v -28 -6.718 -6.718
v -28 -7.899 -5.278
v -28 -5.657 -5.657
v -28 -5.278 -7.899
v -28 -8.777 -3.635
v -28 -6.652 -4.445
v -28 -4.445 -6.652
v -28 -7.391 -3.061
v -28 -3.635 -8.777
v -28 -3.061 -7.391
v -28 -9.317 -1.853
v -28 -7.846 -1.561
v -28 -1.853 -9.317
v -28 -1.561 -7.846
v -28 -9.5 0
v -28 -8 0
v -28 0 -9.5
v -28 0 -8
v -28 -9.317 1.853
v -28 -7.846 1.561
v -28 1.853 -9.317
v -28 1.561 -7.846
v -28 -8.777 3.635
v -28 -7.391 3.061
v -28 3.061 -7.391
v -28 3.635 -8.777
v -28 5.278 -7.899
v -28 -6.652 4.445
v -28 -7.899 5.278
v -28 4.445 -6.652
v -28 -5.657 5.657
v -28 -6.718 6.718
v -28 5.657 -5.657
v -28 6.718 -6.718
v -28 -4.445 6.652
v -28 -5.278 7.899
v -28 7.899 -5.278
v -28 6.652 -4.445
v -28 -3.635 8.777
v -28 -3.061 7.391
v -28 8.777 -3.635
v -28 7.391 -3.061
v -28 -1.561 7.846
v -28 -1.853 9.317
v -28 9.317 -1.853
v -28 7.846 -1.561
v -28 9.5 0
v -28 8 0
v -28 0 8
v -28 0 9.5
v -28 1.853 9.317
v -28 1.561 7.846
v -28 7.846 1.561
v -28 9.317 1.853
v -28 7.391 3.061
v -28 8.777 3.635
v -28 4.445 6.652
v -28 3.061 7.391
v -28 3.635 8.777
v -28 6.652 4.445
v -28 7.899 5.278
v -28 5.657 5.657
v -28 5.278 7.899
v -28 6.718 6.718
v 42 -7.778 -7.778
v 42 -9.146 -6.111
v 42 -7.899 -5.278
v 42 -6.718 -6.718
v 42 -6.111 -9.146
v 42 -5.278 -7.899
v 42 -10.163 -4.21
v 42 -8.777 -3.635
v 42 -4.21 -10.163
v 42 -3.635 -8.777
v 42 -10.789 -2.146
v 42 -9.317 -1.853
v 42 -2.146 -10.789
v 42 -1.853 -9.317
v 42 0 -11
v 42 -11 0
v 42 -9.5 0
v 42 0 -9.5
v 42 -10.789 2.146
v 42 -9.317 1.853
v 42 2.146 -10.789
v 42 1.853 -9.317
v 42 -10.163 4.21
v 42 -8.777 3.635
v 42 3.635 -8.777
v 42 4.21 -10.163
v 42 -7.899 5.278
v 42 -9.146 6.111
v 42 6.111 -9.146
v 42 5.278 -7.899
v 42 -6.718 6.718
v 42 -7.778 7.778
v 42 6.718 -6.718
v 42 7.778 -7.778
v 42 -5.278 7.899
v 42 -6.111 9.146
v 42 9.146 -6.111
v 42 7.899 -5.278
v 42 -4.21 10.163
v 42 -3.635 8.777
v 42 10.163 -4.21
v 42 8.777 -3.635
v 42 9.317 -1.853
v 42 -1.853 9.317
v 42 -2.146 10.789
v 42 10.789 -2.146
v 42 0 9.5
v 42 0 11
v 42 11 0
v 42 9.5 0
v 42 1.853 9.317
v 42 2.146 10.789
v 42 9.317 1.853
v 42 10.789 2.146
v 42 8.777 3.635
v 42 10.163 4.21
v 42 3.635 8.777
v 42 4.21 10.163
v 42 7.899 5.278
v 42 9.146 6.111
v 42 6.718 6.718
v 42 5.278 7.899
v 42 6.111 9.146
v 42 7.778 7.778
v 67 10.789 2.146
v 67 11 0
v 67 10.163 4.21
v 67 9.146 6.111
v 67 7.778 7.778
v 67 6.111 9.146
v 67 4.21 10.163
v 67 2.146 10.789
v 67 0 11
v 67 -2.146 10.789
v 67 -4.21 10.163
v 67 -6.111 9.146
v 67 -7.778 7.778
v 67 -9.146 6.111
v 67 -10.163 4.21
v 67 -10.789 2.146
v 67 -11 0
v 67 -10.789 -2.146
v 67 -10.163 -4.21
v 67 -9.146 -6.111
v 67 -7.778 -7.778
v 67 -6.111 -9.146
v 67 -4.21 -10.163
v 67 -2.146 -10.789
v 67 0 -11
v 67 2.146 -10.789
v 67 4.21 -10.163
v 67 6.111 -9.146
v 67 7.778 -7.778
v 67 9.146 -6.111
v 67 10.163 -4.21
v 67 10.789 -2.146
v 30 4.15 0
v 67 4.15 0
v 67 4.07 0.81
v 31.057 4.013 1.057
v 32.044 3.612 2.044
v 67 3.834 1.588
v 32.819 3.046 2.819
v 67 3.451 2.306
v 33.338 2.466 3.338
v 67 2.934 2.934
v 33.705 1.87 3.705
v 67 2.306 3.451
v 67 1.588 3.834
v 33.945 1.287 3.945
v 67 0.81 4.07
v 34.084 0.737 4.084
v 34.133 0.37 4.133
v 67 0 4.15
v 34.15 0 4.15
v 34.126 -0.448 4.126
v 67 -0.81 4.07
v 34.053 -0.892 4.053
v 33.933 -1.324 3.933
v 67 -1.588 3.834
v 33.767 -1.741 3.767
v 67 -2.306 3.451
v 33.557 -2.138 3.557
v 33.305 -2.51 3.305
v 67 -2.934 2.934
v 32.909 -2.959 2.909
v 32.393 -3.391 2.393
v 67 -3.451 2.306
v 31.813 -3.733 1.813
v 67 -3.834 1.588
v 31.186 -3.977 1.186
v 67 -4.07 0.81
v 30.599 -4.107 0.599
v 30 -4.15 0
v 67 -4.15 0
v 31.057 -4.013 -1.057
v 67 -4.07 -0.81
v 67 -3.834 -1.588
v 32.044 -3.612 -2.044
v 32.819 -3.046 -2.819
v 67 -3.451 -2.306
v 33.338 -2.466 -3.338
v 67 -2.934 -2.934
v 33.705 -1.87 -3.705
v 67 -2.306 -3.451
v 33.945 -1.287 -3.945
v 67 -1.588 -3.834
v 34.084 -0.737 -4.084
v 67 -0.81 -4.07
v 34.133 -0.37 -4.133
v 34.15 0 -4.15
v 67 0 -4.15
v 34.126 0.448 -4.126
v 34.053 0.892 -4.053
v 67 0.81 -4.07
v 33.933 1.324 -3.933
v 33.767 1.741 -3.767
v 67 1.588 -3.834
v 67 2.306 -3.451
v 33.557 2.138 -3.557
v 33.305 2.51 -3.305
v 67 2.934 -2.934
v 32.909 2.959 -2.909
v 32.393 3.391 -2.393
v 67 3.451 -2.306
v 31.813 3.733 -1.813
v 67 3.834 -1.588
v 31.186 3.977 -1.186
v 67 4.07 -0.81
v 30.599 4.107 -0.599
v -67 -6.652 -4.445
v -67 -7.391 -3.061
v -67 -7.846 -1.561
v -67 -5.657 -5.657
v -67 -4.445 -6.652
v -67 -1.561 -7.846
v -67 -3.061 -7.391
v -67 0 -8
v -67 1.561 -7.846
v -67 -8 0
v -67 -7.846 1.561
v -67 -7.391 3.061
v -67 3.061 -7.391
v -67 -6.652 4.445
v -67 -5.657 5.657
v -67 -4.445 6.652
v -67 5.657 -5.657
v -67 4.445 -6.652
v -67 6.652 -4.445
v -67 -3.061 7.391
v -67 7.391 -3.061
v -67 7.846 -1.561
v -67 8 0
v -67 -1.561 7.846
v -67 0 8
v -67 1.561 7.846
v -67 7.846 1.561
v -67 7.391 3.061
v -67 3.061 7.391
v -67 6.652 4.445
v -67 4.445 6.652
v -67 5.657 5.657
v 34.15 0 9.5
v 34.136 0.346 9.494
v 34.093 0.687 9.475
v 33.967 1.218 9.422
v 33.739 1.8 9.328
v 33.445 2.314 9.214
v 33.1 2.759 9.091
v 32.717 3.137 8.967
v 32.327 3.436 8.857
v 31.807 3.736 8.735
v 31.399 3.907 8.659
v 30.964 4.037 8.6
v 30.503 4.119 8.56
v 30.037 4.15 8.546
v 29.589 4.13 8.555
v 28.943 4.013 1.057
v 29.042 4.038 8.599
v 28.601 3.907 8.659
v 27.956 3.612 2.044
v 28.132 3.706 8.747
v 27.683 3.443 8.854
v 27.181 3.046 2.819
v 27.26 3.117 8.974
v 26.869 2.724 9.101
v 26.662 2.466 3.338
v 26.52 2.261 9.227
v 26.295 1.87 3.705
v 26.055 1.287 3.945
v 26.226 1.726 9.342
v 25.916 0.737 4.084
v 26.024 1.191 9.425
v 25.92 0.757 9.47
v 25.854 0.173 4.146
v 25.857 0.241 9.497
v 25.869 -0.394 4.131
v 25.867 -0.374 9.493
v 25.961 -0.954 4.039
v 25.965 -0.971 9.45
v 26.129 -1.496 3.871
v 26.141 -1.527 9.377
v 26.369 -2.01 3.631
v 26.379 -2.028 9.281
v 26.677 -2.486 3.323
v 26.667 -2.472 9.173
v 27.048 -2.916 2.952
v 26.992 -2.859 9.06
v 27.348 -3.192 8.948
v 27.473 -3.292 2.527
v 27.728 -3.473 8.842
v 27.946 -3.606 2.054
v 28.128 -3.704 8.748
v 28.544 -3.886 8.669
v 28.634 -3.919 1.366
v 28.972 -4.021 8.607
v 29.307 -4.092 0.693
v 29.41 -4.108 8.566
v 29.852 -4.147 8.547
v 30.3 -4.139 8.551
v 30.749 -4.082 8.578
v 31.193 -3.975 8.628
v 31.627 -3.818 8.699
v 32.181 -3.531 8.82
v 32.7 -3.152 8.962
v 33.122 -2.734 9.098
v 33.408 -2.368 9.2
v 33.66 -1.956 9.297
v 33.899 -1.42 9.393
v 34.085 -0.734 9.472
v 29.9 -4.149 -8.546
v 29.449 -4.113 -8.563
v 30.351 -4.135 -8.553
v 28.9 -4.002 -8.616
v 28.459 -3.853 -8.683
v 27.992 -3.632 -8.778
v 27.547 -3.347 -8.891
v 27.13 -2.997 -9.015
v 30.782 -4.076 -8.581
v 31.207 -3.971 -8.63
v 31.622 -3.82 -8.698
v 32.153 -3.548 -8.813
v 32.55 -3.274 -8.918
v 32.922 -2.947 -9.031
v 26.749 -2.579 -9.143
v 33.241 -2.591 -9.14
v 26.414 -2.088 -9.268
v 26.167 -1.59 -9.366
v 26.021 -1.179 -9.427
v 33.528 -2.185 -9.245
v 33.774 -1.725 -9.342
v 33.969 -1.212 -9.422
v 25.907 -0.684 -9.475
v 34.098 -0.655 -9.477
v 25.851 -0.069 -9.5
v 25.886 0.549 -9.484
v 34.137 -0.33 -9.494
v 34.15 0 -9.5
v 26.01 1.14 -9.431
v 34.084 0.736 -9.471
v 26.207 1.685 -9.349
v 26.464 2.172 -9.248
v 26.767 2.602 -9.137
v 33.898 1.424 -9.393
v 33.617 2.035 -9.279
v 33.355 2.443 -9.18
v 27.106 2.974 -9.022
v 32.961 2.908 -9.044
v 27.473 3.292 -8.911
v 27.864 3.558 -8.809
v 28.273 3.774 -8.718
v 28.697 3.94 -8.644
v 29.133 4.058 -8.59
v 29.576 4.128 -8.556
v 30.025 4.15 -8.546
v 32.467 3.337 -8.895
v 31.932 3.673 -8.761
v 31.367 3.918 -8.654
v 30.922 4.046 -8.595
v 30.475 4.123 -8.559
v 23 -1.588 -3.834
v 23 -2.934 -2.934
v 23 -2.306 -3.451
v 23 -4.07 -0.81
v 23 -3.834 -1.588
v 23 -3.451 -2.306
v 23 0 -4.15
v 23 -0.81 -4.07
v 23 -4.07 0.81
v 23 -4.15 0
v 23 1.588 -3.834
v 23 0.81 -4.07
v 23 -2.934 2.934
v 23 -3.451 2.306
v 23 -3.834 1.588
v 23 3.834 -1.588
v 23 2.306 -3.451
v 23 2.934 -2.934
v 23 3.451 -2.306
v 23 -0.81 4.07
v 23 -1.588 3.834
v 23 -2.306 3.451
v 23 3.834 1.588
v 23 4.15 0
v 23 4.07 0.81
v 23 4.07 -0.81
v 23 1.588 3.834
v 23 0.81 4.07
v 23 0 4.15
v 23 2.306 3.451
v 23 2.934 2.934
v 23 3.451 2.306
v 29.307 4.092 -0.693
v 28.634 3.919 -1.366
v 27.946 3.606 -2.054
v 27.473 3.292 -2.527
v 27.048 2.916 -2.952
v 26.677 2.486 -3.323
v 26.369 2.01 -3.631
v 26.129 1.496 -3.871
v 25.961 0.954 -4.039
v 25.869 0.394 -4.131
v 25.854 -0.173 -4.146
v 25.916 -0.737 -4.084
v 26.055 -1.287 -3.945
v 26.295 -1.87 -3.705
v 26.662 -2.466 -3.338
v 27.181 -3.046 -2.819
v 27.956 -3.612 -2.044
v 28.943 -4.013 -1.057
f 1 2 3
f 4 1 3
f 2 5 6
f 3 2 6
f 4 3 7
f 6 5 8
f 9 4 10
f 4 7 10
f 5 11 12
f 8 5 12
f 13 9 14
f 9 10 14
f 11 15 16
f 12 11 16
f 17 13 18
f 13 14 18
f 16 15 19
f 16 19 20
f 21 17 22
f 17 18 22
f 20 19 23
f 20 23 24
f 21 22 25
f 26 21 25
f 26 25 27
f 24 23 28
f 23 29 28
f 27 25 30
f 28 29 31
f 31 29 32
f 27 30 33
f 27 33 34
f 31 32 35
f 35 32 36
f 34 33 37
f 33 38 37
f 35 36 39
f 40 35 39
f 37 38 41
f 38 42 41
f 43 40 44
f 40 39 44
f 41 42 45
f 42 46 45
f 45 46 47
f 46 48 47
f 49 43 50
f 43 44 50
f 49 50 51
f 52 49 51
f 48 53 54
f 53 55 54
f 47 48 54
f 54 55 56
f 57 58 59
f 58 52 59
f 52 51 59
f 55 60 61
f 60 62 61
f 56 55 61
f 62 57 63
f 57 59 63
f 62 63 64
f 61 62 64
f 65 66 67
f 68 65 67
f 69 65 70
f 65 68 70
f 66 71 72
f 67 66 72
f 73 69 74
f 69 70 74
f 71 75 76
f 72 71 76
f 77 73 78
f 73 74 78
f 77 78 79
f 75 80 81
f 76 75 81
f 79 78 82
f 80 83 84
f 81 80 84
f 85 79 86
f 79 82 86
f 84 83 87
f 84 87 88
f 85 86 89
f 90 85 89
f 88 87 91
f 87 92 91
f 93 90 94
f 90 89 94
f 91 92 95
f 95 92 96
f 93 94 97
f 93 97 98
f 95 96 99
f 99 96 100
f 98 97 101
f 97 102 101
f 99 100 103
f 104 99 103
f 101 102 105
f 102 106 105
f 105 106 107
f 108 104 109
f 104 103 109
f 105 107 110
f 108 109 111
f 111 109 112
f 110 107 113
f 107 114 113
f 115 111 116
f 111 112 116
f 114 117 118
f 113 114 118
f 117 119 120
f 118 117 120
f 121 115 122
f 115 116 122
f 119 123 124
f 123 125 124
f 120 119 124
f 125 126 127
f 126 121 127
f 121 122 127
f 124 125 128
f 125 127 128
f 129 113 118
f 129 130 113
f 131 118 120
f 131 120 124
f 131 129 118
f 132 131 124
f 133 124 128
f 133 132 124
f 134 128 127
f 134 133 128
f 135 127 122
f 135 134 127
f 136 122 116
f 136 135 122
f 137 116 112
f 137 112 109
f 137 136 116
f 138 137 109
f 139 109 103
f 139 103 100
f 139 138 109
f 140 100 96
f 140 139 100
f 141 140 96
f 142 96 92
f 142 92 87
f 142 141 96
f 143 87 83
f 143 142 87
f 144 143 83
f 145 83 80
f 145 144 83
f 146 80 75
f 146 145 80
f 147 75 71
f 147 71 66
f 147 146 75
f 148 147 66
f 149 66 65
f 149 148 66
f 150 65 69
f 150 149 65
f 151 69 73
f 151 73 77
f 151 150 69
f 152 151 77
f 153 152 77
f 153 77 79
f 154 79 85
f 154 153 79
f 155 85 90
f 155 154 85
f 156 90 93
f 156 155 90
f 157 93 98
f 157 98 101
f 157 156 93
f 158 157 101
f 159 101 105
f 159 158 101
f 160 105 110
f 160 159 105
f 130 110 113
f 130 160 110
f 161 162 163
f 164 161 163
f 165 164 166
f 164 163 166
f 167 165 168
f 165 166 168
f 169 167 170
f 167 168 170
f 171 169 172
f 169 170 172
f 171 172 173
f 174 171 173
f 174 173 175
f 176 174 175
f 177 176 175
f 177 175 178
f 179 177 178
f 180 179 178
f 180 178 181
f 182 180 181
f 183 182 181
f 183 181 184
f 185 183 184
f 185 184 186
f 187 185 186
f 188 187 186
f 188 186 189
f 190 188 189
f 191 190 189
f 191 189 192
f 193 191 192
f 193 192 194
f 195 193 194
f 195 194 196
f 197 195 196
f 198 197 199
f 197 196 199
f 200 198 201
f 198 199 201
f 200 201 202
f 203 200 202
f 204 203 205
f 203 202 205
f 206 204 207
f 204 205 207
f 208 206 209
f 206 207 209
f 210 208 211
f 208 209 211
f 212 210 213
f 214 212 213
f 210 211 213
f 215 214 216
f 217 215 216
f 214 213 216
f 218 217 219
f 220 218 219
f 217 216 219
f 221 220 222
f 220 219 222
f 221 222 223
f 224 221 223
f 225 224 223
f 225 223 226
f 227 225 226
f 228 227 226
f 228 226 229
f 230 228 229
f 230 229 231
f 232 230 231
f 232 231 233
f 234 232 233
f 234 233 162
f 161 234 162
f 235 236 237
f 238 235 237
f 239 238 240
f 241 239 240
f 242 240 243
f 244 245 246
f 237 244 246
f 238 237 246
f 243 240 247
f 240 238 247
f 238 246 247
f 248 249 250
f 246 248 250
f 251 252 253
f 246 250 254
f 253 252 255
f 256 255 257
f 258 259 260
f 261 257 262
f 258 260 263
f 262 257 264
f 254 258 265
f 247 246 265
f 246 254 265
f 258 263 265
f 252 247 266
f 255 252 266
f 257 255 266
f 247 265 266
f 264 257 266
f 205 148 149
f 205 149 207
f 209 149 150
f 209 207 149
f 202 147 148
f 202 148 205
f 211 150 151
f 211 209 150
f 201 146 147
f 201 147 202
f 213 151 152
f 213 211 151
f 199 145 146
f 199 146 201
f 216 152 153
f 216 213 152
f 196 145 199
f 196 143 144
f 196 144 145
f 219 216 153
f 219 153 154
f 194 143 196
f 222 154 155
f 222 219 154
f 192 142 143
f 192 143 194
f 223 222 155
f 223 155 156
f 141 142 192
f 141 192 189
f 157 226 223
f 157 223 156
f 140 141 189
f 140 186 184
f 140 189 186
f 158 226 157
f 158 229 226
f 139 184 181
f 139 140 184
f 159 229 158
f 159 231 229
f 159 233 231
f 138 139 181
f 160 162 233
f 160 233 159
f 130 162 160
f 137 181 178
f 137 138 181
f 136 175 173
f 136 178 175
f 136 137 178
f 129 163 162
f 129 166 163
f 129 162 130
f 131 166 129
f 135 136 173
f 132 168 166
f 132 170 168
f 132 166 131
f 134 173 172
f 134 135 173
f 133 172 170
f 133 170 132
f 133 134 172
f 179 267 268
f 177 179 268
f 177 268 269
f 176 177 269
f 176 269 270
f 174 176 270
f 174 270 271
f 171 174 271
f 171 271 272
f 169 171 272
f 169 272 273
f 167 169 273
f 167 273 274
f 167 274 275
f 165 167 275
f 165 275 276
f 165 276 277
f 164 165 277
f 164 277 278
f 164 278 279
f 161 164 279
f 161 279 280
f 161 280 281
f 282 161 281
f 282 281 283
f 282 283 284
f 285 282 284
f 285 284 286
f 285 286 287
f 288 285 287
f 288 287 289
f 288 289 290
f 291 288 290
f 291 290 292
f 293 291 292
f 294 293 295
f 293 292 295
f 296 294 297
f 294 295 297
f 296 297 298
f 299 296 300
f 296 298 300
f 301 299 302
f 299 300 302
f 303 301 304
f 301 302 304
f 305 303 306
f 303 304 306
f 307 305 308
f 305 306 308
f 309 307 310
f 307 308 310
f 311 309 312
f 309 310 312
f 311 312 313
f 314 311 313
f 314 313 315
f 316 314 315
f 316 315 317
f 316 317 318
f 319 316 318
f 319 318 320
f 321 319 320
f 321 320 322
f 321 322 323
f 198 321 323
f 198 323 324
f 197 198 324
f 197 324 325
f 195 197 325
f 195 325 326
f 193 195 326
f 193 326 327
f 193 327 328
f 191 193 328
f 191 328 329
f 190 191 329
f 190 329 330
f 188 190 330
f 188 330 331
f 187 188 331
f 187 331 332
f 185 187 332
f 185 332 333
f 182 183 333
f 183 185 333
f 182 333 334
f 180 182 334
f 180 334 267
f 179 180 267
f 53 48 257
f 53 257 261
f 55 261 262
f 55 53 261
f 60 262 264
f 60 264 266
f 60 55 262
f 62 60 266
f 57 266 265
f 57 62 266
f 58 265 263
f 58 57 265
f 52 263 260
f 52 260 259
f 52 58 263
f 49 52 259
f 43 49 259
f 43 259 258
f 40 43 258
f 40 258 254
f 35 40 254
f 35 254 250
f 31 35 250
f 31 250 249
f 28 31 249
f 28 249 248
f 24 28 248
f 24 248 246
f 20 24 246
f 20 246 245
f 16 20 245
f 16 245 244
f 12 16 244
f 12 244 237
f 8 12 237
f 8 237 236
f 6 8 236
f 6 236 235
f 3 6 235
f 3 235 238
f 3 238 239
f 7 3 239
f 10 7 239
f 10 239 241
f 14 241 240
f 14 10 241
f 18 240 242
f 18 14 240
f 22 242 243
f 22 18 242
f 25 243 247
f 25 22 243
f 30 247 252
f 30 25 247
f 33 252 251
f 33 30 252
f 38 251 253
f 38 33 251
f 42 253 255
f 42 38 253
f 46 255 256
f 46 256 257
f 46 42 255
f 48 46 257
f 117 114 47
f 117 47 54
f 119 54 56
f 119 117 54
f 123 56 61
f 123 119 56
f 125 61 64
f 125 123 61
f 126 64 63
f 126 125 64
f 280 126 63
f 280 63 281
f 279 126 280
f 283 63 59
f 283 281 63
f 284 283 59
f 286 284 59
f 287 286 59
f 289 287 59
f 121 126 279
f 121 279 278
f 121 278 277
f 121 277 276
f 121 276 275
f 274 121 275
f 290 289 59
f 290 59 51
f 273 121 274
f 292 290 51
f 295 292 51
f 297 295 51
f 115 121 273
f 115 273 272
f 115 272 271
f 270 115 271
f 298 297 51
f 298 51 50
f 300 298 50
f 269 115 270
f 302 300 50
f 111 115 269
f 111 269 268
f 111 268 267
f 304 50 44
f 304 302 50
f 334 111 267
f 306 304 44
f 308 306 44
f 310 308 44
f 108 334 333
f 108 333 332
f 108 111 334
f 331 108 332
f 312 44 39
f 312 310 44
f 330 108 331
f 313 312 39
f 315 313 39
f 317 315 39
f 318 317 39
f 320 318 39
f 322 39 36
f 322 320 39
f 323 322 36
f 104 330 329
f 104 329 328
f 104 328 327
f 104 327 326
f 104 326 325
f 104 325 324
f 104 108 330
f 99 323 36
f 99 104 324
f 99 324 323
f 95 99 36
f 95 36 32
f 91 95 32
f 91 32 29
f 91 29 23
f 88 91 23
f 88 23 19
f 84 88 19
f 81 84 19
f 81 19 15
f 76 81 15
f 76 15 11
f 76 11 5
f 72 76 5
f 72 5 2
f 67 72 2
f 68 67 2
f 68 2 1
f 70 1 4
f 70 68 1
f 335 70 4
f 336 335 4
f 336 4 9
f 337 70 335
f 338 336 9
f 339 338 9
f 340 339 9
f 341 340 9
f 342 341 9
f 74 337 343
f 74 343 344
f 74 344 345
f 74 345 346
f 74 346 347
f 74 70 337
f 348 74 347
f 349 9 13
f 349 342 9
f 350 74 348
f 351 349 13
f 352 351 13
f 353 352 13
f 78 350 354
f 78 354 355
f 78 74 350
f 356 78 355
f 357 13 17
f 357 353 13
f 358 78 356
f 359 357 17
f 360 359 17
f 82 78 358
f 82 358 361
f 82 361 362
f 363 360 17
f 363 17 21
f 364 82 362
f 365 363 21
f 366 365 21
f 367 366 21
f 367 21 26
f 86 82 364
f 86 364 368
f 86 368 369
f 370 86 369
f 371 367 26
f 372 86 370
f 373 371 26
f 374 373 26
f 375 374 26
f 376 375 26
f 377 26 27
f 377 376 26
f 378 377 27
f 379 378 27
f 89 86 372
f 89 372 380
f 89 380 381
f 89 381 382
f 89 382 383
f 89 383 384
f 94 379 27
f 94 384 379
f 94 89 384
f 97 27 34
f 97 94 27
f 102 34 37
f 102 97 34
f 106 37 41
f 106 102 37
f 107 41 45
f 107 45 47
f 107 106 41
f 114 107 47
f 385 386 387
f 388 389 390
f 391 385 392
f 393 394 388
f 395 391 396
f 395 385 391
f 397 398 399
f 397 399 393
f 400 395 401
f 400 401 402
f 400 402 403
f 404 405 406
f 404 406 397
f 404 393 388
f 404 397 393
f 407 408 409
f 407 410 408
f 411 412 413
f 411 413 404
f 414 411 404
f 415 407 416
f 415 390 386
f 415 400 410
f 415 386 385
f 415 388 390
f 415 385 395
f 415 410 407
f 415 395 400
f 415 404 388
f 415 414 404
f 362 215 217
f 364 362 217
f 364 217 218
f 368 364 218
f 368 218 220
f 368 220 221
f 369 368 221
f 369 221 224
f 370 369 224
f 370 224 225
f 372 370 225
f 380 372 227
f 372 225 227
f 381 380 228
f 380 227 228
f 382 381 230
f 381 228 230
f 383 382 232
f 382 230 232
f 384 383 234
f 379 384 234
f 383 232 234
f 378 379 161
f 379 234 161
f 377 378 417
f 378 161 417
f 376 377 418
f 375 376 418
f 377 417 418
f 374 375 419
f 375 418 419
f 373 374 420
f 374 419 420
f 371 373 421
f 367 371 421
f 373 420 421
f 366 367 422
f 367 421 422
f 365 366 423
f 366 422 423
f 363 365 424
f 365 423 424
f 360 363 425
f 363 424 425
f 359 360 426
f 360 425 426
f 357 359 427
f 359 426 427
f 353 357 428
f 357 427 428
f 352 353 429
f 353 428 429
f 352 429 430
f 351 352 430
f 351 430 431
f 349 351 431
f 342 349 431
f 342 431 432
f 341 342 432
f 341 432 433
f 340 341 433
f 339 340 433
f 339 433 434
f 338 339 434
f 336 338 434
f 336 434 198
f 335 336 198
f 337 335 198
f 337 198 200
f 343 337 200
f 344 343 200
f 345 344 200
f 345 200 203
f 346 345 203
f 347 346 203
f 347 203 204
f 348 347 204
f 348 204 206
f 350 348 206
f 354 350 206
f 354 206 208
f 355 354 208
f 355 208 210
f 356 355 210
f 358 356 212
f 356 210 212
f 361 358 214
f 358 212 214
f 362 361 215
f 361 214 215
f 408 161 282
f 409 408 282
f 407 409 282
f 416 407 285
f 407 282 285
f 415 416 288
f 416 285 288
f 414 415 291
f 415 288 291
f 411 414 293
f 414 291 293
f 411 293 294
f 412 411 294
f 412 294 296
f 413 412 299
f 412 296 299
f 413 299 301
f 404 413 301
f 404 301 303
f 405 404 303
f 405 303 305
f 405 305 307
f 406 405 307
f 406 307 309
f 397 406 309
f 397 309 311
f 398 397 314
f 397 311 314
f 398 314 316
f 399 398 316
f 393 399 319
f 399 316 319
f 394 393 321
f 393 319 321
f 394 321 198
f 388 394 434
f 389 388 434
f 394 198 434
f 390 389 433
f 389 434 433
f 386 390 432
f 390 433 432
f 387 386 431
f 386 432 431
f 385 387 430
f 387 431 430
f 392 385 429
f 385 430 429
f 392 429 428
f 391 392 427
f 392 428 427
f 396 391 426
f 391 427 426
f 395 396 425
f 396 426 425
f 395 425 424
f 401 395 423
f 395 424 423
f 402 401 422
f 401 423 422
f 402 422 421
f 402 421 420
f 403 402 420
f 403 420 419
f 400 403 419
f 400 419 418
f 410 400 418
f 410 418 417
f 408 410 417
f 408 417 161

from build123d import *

# Parameters (mm, degrees)
F0_R      = 11
F1_DEPTH  = 67
F3_R      = 11
F3_R_2    = 9.5
F4_DEPTH  = 70
F6_R      = 11
F6_R_2    = 8
F7_DEPTH  = 39.001
F8_R      = 4.15
F9_DEPTH  = 44
F11_R     = 4.15
F12_DEPTH = 20.501


with BuildPart() as f1:
    # F0 (on Right) → F1 (new body, symmetric)
    with BuildSketch(Plane.YZ):
        Circle(F0_R)
    extrude(amount=F1_DEPTH, both=True)

    # F3 (on offset) → F4 (cut)
    with BuildSketch(Plane.YZ.offset(42)):
        Circle(F3_R)
        Circle(F3_R_2, mode=Mode.SUBTRACT)
    extrude(amount=-F4_DEPTH, mode=Mode.SUBTRACT)

    # F6 (on offset) → F7 (cut, through all)
    with BuildSketch(Plane.YZ.offset(-28)):
        Circle(F6_R)
        Circle(F6_R_2, mode=Mode.SUBTRACT)
    extrude(amount=-F7_DEPTH, mode=Mode.SUBTRACT)

    # F8 (on face) → F9 (cut)
    with BuildSketch(Plane.YZ.offset(67)):
        Circle(F8_R)
    extrude(amount=-F9_DEPTH, mode=Mode.SUBTRACT)

    # F11 (on offset) → F12 (cut, through all)
    with BuildSketch(Plane.XY.offset(9.5)):
        with Locations((30, 0)):
            Circle(F11_R)
    extrude(amount=-F12_DEPTH, mode=Mode.SUBTRACT)


solid = f1.part
